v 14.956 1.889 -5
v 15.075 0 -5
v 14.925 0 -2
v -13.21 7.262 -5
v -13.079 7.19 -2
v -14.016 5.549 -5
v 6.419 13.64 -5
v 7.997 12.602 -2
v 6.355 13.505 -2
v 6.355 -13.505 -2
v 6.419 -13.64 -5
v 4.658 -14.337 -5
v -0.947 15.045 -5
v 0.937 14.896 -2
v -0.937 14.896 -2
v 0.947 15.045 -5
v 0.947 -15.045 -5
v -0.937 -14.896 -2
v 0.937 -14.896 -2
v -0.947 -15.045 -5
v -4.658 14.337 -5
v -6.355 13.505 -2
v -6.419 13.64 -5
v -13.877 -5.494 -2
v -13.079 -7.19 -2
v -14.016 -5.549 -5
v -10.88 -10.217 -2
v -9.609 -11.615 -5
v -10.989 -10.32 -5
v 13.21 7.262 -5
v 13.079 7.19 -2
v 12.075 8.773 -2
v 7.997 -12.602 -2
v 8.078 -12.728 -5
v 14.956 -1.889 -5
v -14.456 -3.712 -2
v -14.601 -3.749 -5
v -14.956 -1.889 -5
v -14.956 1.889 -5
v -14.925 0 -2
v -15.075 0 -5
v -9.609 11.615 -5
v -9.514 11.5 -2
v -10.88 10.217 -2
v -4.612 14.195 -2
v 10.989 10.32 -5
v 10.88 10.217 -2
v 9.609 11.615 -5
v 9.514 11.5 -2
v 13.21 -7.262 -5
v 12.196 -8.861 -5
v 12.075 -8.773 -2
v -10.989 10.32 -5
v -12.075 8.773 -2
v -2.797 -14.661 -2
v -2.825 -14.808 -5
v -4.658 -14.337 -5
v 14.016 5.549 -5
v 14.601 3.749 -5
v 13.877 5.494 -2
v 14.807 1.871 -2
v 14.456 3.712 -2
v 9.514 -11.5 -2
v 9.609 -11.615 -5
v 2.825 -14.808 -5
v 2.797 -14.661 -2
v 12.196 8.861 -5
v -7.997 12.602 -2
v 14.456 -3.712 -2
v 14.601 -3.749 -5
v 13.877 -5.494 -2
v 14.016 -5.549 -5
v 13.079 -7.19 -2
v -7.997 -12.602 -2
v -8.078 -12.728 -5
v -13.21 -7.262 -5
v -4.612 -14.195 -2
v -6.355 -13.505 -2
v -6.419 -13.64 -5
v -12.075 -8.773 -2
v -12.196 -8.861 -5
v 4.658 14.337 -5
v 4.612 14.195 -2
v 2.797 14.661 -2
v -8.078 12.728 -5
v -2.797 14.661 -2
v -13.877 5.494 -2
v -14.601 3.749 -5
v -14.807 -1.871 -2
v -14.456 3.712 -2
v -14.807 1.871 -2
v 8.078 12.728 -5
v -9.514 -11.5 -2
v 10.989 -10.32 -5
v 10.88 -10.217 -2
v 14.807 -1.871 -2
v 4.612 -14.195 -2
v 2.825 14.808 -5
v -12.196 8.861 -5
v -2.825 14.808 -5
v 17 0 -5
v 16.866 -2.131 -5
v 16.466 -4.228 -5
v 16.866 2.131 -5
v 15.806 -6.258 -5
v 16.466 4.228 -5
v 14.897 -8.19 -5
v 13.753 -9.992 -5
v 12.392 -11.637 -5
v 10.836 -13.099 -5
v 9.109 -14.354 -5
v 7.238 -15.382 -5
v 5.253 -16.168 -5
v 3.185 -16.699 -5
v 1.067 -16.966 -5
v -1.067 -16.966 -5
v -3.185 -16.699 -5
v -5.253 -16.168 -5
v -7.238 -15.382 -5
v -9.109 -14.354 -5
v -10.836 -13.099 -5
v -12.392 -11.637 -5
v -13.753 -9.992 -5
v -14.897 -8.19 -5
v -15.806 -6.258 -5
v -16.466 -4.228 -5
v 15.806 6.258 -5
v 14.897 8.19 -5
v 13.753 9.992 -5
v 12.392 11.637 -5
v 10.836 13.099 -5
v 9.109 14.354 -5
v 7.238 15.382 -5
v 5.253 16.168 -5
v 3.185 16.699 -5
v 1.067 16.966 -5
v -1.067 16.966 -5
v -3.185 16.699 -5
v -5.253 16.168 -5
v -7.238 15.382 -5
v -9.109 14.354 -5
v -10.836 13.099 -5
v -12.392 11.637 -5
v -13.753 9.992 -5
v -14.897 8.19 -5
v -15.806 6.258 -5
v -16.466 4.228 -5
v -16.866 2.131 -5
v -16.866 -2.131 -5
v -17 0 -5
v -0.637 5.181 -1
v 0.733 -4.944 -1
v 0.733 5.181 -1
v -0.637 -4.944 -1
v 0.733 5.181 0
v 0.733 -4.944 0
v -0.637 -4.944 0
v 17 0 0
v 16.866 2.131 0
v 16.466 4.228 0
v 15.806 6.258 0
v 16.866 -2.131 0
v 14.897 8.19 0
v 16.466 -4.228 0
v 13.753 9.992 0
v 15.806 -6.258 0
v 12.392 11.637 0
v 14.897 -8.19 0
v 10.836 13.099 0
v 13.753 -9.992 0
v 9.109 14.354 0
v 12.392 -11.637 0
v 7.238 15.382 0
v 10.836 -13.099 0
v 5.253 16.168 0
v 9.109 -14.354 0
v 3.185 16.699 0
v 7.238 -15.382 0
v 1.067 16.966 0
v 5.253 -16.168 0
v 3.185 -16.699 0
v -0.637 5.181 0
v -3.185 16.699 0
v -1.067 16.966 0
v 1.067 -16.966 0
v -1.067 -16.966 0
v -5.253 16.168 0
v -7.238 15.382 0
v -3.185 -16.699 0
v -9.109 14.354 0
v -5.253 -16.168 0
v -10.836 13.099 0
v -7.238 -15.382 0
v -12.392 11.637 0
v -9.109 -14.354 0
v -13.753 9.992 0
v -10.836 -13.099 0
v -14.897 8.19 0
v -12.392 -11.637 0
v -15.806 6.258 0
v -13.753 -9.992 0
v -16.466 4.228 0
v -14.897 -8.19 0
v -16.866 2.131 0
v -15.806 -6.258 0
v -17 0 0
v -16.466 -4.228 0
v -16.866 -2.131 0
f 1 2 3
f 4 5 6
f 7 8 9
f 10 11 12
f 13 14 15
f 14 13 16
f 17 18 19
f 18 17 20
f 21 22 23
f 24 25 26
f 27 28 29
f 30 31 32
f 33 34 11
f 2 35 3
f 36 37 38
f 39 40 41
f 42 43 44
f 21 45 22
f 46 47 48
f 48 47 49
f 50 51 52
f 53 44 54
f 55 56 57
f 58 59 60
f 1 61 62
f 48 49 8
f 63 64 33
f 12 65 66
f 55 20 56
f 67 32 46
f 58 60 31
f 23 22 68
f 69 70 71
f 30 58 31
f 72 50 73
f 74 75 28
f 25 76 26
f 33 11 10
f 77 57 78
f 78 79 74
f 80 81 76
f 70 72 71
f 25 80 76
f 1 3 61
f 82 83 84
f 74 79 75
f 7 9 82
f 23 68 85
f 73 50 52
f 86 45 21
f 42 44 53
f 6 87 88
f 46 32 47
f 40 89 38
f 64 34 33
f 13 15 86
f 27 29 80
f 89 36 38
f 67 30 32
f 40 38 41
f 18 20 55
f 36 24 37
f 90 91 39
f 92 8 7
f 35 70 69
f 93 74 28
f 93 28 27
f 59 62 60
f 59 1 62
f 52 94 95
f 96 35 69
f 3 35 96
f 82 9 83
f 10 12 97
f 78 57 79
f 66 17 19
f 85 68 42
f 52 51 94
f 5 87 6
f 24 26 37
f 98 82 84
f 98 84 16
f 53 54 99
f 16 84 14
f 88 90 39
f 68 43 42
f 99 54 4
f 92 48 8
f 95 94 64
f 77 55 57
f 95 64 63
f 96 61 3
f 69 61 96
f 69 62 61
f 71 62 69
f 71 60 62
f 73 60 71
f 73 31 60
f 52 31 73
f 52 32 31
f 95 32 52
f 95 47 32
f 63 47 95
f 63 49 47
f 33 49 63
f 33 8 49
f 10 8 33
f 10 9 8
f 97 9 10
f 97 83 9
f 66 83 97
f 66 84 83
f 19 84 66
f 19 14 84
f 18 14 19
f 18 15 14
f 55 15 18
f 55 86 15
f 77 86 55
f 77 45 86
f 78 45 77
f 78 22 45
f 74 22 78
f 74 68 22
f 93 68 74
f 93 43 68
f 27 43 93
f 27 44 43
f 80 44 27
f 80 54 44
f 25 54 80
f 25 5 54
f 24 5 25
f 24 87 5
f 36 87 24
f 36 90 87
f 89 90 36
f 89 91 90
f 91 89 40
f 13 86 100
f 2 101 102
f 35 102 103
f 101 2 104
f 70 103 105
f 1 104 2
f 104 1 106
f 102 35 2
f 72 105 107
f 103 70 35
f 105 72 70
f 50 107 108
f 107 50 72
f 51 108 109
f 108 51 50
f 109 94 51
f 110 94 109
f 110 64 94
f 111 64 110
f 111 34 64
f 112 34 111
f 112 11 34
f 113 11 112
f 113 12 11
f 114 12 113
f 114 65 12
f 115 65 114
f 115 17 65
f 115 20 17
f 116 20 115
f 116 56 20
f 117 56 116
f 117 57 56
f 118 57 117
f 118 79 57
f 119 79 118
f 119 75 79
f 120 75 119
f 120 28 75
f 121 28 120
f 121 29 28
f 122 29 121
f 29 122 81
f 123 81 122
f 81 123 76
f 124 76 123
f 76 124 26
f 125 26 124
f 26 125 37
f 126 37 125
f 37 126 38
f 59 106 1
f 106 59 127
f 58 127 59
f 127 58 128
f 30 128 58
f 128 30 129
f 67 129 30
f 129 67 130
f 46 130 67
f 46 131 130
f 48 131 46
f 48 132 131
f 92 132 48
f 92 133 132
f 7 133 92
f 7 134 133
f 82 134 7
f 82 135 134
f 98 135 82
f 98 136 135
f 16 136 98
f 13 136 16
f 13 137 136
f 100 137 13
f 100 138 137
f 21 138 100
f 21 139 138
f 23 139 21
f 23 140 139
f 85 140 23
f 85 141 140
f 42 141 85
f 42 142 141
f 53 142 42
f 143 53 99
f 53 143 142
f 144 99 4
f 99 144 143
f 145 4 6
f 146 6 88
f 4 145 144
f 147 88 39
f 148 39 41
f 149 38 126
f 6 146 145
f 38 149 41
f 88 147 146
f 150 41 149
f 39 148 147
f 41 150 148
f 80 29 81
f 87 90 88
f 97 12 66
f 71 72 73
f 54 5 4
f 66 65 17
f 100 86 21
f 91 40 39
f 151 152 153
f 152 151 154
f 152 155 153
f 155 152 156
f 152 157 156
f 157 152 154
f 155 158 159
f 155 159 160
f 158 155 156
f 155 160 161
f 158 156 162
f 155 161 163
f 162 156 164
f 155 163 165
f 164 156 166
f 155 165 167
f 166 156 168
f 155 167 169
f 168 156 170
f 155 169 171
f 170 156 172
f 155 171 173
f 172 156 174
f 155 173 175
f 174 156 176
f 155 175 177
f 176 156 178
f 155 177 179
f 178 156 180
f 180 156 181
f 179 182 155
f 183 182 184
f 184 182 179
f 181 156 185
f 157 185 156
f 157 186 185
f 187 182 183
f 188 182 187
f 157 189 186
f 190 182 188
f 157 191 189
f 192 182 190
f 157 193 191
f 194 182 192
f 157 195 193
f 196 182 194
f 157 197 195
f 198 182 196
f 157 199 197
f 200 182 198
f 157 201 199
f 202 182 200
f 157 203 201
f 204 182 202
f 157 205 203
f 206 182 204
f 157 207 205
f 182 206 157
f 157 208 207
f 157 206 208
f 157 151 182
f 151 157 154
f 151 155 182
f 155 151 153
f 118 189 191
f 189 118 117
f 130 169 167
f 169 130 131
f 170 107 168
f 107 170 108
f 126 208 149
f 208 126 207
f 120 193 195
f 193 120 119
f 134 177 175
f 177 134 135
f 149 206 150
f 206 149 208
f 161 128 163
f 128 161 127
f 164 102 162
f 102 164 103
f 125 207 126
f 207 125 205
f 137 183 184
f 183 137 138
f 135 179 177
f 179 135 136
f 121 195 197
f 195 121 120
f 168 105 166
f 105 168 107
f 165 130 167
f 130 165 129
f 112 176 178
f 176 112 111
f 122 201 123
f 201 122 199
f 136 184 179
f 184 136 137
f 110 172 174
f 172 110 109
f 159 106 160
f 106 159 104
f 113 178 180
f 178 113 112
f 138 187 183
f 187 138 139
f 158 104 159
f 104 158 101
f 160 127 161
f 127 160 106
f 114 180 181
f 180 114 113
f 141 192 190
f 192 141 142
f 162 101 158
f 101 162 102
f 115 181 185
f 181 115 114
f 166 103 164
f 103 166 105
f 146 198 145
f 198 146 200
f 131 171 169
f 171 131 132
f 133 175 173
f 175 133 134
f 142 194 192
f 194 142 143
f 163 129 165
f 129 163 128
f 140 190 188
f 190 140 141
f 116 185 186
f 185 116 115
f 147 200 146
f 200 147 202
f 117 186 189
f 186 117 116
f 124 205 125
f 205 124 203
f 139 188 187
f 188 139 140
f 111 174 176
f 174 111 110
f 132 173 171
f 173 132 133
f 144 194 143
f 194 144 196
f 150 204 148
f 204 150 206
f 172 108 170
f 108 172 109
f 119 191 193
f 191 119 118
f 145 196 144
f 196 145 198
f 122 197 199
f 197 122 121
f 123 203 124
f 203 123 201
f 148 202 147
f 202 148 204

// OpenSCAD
$fn = 50;


difference() {
	union() {
		translate(v = [0, 0, -5.0000000000]) {
			cylinder(h = 5, r = 17.0000000000);
		}
	}
	union() {
		#translate(v = [0, 0, -5.0000000000]) {
			cylinder(h = 3, r1 = 15.0750000000, r2 = 14.9250000000);
		}
		translate(v = [0, 0, -1]) {
			linear_extrude(height = 1) {
				text(font = "Impact", halign = "center", size = 10, text = "I", valign = "center");
			}
		}
	}
}
